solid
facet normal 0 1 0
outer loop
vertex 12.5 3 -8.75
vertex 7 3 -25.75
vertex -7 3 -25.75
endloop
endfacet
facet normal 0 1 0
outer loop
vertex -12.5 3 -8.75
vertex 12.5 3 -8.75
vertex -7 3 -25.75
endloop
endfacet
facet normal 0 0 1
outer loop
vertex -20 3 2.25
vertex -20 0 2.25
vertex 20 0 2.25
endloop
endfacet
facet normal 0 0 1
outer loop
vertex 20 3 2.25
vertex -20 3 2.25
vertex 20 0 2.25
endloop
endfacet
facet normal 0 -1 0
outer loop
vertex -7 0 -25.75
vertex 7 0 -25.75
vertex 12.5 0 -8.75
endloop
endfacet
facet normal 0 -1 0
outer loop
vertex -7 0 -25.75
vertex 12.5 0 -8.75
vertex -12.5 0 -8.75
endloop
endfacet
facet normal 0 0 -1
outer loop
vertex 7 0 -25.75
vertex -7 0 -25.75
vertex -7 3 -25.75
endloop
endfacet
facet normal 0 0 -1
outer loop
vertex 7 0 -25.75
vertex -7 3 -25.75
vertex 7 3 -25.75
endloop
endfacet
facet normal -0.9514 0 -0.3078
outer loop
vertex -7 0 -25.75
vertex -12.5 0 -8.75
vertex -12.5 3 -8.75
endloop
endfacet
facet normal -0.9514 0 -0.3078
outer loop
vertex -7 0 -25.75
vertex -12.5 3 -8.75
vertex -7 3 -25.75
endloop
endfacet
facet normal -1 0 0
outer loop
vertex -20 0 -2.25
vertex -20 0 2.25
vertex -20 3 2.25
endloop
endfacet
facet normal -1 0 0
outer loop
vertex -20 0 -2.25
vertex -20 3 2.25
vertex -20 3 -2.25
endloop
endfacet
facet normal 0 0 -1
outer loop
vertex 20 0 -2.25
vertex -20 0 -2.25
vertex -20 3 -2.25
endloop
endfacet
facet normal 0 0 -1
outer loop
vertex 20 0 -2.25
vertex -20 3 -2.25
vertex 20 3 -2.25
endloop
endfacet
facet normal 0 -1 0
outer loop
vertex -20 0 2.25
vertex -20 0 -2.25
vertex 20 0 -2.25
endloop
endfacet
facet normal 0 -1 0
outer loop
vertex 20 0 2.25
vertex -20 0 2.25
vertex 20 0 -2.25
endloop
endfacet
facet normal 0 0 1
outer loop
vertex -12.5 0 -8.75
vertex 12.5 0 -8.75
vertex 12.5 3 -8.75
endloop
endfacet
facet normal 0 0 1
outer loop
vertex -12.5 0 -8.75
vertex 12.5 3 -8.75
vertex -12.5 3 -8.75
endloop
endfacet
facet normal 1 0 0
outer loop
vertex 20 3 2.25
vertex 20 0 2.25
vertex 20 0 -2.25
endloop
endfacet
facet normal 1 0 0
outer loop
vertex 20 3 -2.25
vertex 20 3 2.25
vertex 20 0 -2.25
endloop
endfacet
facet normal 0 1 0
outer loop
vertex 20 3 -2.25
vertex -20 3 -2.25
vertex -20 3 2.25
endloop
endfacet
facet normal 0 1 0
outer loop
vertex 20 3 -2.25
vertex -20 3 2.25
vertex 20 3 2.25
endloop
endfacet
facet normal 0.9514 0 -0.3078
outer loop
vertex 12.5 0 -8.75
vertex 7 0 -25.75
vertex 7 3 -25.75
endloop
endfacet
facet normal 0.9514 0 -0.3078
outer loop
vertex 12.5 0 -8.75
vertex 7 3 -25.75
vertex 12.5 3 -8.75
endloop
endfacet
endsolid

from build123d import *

# Parameters (mm, degrees)
SKETCH1_W             = 40
SKETCH1_H             = 4.5
BOSS_EXTRUDE1_DEPTH   = 3
BOSS_EXTRUDE1_2_DEPTH = 3


with BuildPart() as part:
    # Sketch1 → Boss-Extrude1 (new body)
    with BuildSketch(Plane(origin=(0, 0, 0), x_dir=(1, 0, 0), z_dir=(0, 1, 0))):
        Rectangle(SKETCH1_W, SKETCH1_H)
    extrude(amount=BOSS_EXTRUDE1_DEPTH)


with BuildPart() as body_2:
    # Sketch1 → Boss-Extrude1 2 (new body)
    with BuildSketch(Plane(origin=(0, 0, 0), x_dir=(1, 0, 0), z_dir=(0, 1, 0))):
        Polygon((7, 25.75), (12.5, 8.75), (-12.5, 8.75), (-7, 25.75), align=None)
    extrude(amount=BOSS_EXTRUDE1_2_DEPTH)


solid = Compound([part.part, body_2.part])
